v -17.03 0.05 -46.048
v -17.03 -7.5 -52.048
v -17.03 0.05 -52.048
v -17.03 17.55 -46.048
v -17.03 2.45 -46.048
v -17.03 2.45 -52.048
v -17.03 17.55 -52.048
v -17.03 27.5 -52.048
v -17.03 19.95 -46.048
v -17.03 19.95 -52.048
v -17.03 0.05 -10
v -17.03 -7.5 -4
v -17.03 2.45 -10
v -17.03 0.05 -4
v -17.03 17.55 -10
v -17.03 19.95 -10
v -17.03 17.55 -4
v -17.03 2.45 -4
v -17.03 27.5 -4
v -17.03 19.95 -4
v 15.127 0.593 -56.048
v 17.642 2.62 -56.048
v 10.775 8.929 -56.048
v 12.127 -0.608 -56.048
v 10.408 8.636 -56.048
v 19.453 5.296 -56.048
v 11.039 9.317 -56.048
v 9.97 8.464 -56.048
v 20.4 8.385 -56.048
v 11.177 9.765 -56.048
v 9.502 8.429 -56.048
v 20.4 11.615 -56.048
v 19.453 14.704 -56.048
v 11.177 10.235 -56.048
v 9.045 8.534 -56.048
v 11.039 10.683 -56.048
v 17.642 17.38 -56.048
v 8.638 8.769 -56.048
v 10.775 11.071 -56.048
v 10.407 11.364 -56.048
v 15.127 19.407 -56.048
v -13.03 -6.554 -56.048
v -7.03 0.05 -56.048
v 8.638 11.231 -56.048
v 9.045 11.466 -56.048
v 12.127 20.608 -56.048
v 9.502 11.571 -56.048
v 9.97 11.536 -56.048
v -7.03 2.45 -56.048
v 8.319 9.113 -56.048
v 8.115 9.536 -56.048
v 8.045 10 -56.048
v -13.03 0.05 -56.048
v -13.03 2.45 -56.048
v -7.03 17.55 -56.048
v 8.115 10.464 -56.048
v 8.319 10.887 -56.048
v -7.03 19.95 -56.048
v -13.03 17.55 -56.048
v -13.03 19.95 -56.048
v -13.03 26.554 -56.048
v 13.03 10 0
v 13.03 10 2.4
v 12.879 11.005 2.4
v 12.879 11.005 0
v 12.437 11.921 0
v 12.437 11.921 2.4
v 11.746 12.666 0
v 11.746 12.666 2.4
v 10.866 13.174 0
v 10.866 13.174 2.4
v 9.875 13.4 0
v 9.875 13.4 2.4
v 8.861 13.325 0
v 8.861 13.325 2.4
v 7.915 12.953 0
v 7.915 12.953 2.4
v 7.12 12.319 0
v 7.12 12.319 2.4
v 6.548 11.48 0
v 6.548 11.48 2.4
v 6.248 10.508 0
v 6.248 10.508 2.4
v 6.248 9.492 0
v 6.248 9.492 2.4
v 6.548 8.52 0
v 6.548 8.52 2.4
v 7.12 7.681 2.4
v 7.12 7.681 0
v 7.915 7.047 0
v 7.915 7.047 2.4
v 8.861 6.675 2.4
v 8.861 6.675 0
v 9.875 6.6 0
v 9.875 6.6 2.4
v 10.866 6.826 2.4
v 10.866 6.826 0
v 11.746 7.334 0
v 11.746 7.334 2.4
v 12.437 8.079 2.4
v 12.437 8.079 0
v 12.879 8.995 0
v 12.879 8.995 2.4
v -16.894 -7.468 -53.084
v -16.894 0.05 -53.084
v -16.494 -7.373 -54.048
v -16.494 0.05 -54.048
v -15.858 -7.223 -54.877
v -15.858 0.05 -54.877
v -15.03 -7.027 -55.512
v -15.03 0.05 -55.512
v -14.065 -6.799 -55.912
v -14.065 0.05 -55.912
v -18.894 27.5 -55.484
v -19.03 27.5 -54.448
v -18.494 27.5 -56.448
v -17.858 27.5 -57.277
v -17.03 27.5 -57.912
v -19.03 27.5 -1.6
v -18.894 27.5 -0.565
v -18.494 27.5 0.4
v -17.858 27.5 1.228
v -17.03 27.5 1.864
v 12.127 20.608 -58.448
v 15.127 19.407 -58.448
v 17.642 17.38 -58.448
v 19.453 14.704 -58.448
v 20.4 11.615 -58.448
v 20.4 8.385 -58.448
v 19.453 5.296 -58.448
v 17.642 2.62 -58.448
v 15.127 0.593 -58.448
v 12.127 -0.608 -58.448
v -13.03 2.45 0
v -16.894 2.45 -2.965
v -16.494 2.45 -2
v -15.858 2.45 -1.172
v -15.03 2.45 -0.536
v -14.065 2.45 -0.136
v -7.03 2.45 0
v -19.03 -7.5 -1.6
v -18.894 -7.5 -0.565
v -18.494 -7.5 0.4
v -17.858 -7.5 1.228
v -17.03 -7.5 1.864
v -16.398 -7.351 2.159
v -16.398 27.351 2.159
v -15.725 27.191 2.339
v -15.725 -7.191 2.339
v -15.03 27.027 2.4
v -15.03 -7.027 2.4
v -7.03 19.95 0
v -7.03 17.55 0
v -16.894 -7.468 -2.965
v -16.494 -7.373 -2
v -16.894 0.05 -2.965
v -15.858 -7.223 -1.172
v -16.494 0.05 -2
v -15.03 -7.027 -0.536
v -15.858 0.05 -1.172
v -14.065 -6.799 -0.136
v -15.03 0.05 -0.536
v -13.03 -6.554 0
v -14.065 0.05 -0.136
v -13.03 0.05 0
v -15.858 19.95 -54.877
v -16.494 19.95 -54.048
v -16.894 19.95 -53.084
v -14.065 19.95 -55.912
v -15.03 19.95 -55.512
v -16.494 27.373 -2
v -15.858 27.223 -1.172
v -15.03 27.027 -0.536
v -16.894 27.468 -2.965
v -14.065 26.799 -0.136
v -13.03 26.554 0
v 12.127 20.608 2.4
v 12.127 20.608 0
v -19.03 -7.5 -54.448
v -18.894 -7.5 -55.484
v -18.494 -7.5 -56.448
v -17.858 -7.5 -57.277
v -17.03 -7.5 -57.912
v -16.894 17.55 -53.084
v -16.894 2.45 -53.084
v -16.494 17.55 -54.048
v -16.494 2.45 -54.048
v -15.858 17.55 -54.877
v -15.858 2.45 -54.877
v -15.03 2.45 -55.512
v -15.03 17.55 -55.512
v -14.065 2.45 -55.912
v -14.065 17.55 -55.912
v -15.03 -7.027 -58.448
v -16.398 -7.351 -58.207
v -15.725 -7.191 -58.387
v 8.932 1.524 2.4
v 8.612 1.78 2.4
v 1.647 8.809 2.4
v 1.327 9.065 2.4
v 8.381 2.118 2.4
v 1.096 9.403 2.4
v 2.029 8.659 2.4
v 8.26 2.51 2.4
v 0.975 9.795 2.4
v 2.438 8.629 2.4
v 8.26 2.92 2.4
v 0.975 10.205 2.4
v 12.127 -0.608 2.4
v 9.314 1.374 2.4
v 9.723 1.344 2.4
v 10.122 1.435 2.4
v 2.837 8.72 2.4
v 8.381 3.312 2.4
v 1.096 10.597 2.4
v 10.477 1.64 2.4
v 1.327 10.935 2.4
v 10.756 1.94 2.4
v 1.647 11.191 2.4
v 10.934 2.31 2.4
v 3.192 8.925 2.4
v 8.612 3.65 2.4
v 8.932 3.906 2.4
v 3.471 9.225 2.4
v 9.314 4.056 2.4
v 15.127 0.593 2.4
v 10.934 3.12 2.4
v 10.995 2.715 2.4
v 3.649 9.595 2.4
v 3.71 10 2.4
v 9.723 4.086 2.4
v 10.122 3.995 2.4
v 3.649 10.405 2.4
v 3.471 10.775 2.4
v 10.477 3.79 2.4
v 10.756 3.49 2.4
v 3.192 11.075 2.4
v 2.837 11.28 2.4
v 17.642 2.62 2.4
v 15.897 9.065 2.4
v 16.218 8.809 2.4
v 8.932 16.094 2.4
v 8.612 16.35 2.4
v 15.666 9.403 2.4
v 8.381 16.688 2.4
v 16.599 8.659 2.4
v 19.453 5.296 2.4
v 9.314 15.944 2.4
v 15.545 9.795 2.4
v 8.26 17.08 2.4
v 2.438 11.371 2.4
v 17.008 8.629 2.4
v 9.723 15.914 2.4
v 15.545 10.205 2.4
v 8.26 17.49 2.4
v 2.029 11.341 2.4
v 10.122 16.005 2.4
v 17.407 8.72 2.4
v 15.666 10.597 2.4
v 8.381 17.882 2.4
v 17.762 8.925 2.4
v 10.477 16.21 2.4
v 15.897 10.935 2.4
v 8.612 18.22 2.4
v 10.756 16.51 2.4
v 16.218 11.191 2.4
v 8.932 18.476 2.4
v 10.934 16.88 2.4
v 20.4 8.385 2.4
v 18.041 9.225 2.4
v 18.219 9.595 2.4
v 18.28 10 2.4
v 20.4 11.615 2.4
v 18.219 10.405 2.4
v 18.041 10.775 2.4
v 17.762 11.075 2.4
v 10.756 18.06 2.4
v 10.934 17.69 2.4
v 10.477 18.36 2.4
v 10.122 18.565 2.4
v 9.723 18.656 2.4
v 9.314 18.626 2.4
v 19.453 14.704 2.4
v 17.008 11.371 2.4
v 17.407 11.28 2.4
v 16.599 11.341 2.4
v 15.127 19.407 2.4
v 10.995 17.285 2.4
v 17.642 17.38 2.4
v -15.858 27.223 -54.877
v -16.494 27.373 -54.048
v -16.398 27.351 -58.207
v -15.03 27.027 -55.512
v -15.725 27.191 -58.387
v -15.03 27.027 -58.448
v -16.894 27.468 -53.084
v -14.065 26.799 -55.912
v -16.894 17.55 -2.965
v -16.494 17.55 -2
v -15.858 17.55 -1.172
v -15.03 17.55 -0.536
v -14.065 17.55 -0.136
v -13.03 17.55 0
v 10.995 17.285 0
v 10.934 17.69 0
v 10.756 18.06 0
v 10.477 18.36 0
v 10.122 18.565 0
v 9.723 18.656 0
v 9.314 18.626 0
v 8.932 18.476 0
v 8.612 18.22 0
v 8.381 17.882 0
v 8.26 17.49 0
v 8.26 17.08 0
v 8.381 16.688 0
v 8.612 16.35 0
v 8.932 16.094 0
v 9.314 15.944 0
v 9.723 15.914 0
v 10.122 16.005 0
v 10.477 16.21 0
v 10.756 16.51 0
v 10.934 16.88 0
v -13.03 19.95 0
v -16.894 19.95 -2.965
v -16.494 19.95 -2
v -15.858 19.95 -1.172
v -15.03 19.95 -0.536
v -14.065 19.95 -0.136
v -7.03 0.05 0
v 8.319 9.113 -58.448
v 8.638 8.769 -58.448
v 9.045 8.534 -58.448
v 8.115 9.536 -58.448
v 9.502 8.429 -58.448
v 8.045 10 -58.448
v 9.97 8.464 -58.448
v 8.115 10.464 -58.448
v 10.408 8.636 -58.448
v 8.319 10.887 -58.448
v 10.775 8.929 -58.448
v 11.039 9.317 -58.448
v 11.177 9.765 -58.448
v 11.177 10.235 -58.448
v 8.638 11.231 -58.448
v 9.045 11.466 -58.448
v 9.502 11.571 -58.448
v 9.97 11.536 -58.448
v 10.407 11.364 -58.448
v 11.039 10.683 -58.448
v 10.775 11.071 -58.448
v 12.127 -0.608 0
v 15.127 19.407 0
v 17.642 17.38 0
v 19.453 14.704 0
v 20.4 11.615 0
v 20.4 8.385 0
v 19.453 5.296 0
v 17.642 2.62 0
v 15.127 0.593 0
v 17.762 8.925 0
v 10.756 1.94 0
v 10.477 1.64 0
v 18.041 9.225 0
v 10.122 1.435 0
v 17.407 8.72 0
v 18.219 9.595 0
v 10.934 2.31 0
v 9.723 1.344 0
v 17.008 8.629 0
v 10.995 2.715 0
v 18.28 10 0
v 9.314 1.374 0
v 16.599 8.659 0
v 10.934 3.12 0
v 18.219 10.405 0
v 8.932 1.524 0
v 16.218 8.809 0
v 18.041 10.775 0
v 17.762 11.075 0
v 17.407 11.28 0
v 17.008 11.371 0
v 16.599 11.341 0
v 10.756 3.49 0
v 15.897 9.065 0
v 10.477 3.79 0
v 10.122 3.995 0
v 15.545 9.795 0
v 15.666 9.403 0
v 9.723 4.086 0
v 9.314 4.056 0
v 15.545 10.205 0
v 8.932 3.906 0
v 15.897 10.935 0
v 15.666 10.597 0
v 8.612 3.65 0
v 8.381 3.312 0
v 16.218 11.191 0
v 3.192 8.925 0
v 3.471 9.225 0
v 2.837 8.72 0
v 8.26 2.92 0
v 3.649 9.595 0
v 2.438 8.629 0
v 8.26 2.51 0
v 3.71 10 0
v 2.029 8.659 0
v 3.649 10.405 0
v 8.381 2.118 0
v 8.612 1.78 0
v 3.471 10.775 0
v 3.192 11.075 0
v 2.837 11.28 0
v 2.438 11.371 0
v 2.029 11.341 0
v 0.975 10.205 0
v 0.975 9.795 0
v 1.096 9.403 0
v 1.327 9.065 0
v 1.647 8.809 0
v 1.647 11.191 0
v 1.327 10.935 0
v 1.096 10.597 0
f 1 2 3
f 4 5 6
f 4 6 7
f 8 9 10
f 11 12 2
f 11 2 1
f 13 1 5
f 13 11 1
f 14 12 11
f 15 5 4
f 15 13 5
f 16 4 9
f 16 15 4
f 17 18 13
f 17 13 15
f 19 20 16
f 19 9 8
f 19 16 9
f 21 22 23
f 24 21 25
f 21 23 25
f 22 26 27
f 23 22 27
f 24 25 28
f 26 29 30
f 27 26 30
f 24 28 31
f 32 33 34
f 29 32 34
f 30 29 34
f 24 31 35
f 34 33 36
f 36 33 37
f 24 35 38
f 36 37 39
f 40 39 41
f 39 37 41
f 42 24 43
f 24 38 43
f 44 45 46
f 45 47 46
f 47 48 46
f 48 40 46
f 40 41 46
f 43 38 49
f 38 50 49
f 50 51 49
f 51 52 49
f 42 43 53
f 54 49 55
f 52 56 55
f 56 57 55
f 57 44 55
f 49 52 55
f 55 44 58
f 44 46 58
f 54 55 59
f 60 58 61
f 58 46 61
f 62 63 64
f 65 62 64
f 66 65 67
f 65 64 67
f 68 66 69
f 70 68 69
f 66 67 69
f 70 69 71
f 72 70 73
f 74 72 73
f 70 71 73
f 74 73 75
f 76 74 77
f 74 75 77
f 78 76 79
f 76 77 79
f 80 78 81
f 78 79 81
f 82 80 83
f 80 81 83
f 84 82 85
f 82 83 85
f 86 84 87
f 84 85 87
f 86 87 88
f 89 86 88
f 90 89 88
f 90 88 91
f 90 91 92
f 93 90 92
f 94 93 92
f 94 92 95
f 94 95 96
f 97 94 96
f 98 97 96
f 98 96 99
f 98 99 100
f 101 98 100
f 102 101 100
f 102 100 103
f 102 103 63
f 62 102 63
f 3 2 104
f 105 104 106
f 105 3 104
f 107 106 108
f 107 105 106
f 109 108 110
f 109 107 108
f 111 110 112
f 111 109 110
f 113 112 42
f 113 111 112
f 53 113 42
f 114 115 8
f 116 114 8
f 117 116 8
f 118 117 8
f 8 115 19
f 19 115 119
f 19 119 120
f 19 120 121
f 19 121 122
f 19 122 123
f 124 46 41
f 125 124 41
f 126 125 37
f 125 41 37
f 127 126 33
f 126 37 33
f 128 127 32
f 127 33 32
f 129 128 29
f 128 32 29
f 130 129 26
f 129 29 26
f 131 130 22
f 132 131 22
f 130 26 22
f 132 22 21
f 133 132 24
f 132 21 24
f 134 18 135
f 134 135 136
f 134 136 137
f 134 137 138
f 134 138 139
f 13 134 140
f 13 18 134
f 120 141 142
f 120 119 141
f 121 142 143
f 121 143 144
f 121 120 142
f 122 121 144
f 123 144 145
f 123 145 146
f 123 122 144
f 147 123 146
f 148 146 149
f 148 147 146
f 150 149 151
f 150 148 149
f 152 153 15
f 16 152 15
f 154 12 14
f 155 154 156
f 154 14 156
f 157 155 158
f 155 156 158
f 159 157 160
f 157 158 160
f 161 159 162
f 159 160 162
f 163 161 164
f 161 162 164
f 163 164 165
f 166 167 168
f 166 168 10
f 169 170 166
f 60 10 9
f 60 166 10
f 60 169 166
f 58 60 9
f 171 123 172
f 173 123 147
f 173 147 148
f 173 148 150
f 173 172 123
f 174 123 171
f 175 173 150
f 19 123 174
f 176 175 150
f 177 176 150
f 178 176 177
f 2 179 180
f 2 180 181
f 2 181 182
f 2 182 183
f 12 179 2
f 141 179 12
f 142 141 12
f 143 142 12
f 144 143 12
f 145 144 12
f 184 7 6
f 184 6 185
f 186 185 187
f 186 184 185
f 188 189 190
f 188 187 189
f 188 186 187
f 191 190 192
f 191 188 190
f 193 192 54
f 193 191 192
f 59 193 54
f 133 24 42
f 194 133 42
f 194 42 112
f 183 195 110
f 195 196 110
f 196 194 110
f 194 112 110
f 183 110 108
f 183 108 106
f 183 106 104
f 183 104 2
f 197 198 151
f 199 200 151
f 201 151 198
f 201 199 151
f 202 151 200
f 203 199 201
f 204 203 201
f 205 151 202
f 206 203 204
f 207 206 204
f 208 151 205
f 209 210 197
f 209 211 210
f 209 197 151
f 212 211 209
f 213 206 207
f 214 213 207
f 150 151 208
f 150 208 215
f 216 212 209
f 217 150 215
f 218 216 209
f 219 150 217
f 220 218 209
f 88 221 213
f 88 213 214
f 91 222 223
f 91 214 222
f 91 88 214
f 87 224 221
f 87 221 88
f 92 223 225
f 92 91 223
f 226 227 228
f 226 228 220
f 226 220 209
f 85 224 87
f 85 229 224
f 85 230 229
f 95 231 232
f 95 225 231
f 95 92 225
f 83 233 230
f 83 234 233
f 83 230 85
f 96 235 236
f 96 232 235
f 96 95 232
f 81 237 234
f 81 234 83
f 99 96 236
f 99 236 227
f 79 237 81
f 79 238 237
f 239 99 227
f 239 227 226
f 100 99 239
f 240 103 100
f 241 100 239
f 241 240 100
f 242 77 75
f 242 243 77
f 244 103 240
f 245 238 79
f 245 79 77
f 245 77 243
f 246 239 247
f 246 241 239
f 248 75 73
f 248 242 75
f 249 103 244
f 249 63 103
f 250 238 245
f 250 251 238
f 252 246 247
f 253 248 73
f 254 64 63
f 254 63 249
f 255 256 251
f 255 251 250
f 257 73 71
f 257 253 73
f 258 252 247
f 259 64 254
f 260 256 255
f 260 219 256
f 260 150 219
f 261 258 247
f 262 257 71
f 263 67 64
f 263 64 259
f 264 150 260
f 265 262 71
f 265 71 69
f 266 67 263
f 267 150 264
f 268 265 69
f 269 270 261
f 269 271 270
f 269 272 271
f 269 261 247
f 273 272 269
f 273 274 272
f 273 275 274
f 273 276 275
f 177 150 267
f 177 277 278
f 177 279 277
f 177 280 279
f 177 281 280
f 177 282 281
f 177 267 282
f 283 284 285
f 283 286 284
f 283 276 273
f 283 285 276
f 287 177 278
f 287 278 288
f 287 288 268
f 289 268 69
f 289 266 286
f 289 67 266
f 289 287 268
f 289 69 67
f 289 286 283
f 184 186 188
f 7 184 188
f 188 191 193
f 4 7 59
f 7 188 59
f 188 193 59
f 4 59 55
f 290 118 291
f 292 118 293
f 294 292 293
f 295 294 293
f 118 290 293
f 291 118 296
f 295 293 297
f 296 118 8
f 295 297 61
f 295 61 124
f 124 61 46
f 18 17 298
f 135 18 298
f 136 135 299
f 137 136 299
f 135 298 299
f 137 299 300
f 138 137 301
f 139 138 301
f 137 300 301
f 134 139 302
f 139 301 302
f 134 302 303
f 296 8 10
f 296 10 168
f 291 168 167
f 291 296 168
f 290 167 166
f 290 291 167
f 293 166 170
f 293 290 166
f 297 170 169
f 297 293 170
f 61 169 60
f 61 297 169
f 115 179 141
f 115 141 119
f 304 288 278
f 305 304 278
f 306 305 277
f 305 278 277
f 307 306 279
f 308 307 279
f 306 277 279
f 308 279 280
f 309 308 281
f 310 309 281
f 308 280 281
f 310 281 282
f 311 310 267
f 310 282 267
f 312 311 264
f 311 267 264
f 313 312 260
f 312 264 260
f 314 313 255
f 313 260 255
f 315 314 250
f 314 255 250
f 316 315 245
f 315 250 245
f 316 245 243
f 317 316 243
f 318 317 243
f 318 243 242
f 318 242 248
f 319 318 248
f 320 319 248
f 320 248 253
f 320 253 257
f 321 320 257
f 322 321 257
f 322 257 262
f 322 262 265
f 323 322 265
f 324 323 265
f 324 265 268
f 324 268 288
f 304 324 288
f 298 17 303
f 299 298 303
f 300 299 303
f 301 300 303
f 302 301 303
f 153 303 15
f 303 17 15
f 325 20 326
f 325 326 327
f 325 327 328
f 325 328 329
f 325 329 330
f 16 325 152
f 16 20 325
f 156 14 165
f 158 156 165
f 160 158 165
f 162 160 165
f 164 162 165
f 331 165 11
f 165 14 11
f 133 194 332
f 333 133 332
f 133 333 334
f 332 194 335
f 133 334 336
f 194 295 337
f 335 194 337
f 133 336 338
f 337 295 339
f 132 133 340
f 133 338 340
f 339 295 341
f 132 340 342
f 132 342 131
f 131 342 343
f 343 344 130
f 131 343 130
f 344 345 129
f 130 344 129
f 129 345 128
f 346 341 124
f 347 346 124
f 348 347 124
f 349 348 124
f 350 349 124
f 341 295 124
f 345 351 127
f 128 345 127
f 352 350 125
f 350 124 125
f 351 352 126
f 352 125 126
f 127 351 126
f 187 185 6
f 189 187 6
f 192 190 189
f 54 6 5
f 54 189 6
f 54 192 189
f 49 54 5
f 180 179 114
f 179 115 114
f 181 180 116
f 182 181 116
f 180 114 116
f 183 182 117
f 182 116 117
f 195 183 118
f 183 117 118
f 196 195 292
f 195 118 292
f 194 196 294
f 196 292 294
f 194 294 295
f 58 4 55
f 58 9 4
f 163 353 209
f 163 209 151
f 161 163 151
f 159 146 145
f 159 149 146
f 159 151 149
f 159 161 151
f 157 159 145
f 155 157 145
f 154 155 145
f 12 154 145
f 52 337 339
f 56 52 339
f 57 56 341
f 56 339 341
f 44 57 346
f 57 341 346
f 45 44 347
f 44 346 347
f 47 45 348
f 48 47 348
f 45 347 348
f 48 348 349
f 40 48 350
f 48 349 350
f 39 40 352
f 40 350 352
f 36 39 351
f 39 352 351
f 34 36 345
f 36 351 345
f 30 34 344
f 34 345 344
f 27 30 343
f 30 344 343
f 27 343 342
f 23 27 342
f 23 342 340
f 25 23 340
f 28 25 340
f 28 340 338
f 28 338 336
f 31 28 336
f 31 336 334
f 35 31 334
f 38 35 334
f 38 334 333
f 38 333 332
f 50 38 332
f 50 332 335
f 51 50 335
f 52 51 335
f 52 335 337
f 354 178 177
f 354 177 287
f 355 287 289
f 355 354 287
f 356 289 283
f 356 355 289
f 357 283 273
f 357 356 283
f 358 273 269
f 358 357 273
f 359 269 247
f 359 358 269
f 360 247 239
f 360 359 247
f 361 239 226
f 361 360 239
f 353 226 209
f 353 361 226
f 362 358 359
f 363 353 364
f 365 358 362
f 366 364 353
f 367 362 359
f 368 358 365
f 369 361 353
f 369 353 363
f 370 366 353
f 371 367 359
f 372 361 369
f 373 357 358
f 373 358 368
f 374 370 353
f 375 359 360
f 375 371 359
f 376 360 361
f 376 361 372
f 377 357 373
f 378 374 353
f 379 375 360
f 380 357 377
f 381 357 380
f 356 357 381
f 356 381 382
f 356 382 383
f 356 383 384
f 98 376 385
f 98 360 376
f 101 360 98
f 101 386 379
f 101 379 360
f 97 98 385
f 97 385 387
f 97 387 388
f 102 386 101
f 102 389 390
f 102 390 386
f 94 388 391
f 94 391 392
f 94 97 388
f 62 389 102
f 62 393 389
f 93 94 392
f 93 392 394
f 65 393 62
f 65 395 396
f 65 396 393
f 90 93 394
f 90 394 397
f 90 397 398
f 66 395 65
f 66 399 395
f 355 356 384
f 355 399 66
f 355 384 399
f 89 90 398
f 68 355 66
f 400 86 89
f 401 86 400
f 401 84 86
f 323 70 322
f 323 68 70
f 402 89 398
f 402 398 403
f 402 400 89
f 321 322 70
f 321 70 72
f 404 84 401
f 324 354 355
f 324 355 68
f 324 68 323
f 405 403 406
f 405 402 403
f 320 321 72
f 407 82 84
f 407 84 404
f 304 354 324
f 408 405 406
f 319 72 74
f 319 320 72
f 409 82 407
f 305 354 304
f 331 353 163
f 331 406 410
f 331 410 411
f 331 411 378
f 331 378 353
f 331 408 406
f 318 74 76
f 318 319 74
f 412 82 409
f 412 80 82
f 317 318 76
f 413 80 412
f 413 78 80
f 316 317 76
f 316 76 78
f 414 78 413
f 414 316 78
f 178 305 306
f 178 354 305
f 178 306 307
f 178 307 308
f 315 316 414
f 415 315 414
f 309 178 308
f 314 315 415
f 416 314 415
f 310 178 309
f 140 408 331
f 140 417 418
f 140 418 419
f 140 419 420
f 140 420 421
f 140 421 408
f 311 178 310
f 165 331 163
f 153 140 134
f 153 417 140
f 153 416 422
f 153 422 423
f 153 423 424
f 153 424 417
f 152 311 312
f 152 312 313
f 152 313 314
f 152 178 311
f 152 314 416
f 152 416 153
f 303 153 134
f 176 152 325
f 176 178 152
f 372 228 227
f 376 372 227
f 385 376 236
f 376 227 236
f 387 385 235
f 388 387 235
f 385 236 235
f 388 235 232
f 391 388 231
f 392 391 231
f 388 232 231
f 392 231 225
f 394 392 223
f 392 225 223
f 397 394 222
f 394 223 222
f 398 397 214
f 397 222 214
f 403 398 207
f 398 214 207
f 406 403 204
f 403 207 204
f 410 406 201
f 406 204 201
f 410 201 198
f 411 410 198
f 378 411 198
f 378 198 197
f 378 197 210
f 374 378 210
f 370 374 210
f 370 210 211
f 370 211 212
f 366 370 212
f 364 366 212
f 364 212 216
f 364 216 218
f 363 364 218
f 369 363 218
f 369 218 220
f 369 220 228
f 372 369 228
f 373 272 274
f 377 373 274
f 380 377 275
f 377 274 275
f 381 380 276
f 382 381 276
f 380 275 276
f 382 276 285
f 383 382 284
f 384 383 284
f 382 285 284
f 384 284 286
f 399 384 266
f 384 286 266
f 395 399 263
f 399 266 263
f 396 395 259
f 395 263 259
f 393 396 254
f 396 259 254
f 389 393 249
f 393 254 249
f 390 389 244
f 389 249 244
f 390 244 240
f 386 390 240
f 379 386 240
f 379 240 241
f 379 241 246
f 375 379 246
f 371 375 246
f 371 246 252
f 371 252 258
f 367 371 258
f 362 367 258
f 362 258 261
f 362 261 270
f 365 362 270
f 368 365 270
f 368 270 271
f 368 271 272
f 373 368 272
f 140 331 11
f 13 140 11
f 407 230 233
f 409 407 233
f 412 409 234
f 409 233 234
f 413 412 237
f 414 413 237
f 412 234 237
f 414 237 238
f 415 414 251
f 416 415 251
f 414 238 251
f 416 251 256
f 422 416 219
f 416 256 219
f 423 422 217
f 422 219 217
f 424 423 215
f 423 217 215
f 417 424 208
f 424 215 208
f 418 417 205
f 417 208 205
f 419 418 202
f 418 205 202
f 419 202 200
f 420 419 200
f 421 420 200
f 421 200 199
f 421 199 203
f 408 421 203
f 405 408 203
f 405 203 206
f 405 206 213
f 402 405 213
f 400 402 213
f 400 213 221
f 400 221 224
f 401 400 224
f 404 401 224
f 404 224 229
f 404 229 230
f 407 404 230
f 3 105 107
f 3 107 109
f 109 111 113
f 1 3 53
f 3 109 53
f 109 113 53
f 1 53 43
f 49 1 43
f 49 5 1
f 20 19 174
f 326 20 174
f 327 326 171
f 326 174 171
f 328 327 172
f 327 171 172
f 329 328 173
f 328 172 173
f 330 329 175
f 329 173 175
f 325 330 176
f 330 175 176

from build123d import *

# Parameters (mm, degrees)
BOSS_EXTRUDE1_DEPTH = 2.4
BOSS_EXTRUDE2_DEPTH = 2.4
SKETCH2_W           = 2
SKETCH2_H           = 35
BOSS_EXTRUDE3_DEPTH = 60.848228
CUT_EXTRUDE1_REACH  = 62.848
SKETCH4_R           = 1.575
CUT_EXTRUDE2_REACH  = 62.848
SKETCH6_R           = 3.41
SKETCH6_R_2         = 1.375
FILLET1_R           = 4
BOSS_EXTRUDE4_DEPTH = 1.2
BOSS_EXTRUDE5_DEPTH = 1.2


with BuildPart() as part:
    # Sketch1 → Boss-Extrude1 (new body)
    with BuildSketch(Plane.XY):
        with BuildLine():
            Line((12.127473017, -0.607666052), (-17.03, -7.5))
            Line((-17.03, -7.5), (-17.03, 27.5))
            Line((-17.03, 27.5), (12.127473017, 20.607666052))
            ThreePointArc((12.127473017, 20.607666052), (20.52, 10), (12.127473017, -0.607666052))
        make_face()
    extrude(amount=BOSS_EXTRUDE1_DEPTH)



with BuildPart() as body_2:
    # Sketch3 → Boss-Extrude2 (new body)
    with BuildSketch(Plane(origin=(0, 0, -56.04822809), x_dir=(-1, 0, 0), z_dir=(0, 0, -1))):
        with BuildLine():
            Line((-12.127473017, -0.607666052), (17.03, -7.5))
            Line((17.03, -7.5), (17.03, 27.5))
            Line((17.03, 27.5), (-12.127473017, 20.607666052))
            ThreePointArc((-12.127473017, 20.607666052), (-20.52, 10), (-12.127473017, -0.607666052))
        make_face()
    extrude(amount=BOSS_EXTRUDE2_DEPTH)


with BuildPart() as part_1:
    add(part.part)

    add(body_2.part)  # Boss-Extrude3 merges body 2
    # Sketch2 → Boss-Extrude3 (add)
    with BuildSketch(Plane.XY.offset(2.4)):
        with Locations((-18.03, 10)):
            Rectangle(SKETCH2_W, SKETCH2_H)
    extrude(amount=-BOSS_EXTRUDE3_DEPTH)

    # Sketch4 → Cut-Extrude1 (cut, up to next)
    with BuildSketch(Plane(origin=(0, 0, -58.44822809), x_dir=(-1, 0, 0), z_dir=(0, 0, -1)), mode=Mode.PRIVATE) as cut_extrude1_sk1:
        with Locations((-9.62, 10)):
            Circle(SKETCH4_R)
    cut_extrude1_tool1 = extrude(cut_extrude1_sk1.sketch, amount=-CUT_EXTRUDE1_REACH, mode=Mode.PRIVATE) & part_1.part
    add(cut_extrude1_tool1.solids().sort_by_distance((9.62, 10, -58.448228))[0], mode=Mode.SUBTRACT)

    # Sketch6 → Cut-Extrude2 (cut, up to next)
    with BuildSketch(Plane.XY.offset(2.4), mode=Mode.PRIVATE) as cut_extrude2_sk1:
        with Locations((9.62, 10)):
            Circle(SKETCH6_R)
    cut_extrude2_tool1 = extrude(cut_extrude2_sk1.sketch, amount=-CUT_EXTRUDE2_REACH, mode=Mode.PRIVATE) & part_1.part
    add(cut_extrude2_tool1.solids().sort_by_distance((9.62, 10, 2.4))[0], mode=Mode.SUBTRACT)
    # Sketch6 → Cut-Extrude2 (cut, up to next)
    with BuildSketch(Plane.XY.offset(2.4), mode=Mode.PRIVATE) as cut_extrude2_sk2:
        with Locations((2.335, 10)):
            Circle(SKETCH6_R_2)
    cut_extrude2_tool2 = extrude(cut_extrude2_sk2.sketch, amount=-CUT_EXTRUDE2_REACH, mode=Mode.PRIVATE) & part_1.part
    add(cut_extrude2_tool2.solids().sort_by_distance((2.335, 10, 2.4))[0], mode=Mode.SUBTRACT)
    # Sketch6 → Cut-Extrude2 (cut, up to next)
    with BuildSketch(Plane.XY.offset(2.4), mode=Mode.PRIVATE) as cut_extrude2_sk3:
        with Locations((9.62, 17.285)):
            Circle(SKETCH6_R_2)
    cut_extrude2_tool3 = extrude(cut_extrude2_sk3.sketch, amount=-CUT_EXTRUDE2_REACH, mode=Mode.PRIVATE) & part_1.part
    add(cut_extrude2_tool3.solids().sort_by_distance((9.62, 17.285, 2.4))[0], mode=Mode.SUBTRACT)
    # Sketch6 → Cut-Extrude2 (cut, up to next)
    with BuildSketch(Plane.XY.offset(2.4), mode=Mode.PRIVATE) as cut_extrude2_sk4:
        with Locations((16.905, 10)):
            Circle(SKETCH6_R_2)
    cut_extrude2_tool4 = extrude(cut_extrude2_sk4.sketch, amount=-CUT_EXTRUDE2_REACH, mode=Mode.PRIVATE) & part_1.part
    add(cut_extrude2_tool4.solids().sort_by_distance((16.905, 10, 2.4))[0], mode=Mode.SUBTRACT)
    # Sketch6 → Cut-Extrude2 (cut, up to next)
    with BuildSketch(Plane.XY.offset(2.4), mode=Mode.PRIVATE) as cut_extrude2_sk5:
        with Locations((9.62, 2.715)):
            Circle(SKETCH6_R_2)
    cut_extrude2_tool5 = extrude(cut_extrude2_sk5.sketch, amount=-CUT_EXTRUDE2_REACH, mode=Mode.PRIVATE) & part_1.part
    add(cut_extrude2_tool5.solids().sort_by_distance((9.62, 2.715, 2.4))[0], mode=Mode.SUBTRACT)

    # Fillet1
    fillet1_edges = [part_1.edges().sort_by_distance(p)[0] for p in [
        (-19.03, 10, -58.448228),
        (-19.03, 10, 2.4),
        (-17.03, 10, 0),
        (-17.03, 10, -56.04822809),
    ]]
    fillet(fillet1_edges, radius=FILLET1_R)

    # Sketch9 → Boss-Extrude4 (add, symmetric)
    with BuildSketch(Plane(origin=(0, 18.75, 0), x_dir=(-1, 0, 0), z_dir=(0, -1, 0))):
        Polygon((17.03, 46.04822809), (7.03, 56.04822809), (17.03, 56.04822809), align=None)
        Polygon((17.03, 10), (17.03, 0), (7.03, 0), align=None)
    extrude(amount=BOSS_EXTRUDE4_DEPTH, both=True)

    # Sketch10 → Boss-Extrude5 (add, symmetric)
    with BuildSketch(Plane(origin=(0, 1.25, 0), x_dir=(-1, 0, 0), z_dir=(0, -1, 0))):
        Polygon((7.03, 56.04822809), (17.03, 56.04822809), (17.03, 46.04822809), align=None)
        Polygon((17.03, 10), (17.03, 0), (7.03, 0), align=None)
    extrude(amount=BOSS_EXTRUDE5_DEPTH, both=True)


solid = part_1.part
